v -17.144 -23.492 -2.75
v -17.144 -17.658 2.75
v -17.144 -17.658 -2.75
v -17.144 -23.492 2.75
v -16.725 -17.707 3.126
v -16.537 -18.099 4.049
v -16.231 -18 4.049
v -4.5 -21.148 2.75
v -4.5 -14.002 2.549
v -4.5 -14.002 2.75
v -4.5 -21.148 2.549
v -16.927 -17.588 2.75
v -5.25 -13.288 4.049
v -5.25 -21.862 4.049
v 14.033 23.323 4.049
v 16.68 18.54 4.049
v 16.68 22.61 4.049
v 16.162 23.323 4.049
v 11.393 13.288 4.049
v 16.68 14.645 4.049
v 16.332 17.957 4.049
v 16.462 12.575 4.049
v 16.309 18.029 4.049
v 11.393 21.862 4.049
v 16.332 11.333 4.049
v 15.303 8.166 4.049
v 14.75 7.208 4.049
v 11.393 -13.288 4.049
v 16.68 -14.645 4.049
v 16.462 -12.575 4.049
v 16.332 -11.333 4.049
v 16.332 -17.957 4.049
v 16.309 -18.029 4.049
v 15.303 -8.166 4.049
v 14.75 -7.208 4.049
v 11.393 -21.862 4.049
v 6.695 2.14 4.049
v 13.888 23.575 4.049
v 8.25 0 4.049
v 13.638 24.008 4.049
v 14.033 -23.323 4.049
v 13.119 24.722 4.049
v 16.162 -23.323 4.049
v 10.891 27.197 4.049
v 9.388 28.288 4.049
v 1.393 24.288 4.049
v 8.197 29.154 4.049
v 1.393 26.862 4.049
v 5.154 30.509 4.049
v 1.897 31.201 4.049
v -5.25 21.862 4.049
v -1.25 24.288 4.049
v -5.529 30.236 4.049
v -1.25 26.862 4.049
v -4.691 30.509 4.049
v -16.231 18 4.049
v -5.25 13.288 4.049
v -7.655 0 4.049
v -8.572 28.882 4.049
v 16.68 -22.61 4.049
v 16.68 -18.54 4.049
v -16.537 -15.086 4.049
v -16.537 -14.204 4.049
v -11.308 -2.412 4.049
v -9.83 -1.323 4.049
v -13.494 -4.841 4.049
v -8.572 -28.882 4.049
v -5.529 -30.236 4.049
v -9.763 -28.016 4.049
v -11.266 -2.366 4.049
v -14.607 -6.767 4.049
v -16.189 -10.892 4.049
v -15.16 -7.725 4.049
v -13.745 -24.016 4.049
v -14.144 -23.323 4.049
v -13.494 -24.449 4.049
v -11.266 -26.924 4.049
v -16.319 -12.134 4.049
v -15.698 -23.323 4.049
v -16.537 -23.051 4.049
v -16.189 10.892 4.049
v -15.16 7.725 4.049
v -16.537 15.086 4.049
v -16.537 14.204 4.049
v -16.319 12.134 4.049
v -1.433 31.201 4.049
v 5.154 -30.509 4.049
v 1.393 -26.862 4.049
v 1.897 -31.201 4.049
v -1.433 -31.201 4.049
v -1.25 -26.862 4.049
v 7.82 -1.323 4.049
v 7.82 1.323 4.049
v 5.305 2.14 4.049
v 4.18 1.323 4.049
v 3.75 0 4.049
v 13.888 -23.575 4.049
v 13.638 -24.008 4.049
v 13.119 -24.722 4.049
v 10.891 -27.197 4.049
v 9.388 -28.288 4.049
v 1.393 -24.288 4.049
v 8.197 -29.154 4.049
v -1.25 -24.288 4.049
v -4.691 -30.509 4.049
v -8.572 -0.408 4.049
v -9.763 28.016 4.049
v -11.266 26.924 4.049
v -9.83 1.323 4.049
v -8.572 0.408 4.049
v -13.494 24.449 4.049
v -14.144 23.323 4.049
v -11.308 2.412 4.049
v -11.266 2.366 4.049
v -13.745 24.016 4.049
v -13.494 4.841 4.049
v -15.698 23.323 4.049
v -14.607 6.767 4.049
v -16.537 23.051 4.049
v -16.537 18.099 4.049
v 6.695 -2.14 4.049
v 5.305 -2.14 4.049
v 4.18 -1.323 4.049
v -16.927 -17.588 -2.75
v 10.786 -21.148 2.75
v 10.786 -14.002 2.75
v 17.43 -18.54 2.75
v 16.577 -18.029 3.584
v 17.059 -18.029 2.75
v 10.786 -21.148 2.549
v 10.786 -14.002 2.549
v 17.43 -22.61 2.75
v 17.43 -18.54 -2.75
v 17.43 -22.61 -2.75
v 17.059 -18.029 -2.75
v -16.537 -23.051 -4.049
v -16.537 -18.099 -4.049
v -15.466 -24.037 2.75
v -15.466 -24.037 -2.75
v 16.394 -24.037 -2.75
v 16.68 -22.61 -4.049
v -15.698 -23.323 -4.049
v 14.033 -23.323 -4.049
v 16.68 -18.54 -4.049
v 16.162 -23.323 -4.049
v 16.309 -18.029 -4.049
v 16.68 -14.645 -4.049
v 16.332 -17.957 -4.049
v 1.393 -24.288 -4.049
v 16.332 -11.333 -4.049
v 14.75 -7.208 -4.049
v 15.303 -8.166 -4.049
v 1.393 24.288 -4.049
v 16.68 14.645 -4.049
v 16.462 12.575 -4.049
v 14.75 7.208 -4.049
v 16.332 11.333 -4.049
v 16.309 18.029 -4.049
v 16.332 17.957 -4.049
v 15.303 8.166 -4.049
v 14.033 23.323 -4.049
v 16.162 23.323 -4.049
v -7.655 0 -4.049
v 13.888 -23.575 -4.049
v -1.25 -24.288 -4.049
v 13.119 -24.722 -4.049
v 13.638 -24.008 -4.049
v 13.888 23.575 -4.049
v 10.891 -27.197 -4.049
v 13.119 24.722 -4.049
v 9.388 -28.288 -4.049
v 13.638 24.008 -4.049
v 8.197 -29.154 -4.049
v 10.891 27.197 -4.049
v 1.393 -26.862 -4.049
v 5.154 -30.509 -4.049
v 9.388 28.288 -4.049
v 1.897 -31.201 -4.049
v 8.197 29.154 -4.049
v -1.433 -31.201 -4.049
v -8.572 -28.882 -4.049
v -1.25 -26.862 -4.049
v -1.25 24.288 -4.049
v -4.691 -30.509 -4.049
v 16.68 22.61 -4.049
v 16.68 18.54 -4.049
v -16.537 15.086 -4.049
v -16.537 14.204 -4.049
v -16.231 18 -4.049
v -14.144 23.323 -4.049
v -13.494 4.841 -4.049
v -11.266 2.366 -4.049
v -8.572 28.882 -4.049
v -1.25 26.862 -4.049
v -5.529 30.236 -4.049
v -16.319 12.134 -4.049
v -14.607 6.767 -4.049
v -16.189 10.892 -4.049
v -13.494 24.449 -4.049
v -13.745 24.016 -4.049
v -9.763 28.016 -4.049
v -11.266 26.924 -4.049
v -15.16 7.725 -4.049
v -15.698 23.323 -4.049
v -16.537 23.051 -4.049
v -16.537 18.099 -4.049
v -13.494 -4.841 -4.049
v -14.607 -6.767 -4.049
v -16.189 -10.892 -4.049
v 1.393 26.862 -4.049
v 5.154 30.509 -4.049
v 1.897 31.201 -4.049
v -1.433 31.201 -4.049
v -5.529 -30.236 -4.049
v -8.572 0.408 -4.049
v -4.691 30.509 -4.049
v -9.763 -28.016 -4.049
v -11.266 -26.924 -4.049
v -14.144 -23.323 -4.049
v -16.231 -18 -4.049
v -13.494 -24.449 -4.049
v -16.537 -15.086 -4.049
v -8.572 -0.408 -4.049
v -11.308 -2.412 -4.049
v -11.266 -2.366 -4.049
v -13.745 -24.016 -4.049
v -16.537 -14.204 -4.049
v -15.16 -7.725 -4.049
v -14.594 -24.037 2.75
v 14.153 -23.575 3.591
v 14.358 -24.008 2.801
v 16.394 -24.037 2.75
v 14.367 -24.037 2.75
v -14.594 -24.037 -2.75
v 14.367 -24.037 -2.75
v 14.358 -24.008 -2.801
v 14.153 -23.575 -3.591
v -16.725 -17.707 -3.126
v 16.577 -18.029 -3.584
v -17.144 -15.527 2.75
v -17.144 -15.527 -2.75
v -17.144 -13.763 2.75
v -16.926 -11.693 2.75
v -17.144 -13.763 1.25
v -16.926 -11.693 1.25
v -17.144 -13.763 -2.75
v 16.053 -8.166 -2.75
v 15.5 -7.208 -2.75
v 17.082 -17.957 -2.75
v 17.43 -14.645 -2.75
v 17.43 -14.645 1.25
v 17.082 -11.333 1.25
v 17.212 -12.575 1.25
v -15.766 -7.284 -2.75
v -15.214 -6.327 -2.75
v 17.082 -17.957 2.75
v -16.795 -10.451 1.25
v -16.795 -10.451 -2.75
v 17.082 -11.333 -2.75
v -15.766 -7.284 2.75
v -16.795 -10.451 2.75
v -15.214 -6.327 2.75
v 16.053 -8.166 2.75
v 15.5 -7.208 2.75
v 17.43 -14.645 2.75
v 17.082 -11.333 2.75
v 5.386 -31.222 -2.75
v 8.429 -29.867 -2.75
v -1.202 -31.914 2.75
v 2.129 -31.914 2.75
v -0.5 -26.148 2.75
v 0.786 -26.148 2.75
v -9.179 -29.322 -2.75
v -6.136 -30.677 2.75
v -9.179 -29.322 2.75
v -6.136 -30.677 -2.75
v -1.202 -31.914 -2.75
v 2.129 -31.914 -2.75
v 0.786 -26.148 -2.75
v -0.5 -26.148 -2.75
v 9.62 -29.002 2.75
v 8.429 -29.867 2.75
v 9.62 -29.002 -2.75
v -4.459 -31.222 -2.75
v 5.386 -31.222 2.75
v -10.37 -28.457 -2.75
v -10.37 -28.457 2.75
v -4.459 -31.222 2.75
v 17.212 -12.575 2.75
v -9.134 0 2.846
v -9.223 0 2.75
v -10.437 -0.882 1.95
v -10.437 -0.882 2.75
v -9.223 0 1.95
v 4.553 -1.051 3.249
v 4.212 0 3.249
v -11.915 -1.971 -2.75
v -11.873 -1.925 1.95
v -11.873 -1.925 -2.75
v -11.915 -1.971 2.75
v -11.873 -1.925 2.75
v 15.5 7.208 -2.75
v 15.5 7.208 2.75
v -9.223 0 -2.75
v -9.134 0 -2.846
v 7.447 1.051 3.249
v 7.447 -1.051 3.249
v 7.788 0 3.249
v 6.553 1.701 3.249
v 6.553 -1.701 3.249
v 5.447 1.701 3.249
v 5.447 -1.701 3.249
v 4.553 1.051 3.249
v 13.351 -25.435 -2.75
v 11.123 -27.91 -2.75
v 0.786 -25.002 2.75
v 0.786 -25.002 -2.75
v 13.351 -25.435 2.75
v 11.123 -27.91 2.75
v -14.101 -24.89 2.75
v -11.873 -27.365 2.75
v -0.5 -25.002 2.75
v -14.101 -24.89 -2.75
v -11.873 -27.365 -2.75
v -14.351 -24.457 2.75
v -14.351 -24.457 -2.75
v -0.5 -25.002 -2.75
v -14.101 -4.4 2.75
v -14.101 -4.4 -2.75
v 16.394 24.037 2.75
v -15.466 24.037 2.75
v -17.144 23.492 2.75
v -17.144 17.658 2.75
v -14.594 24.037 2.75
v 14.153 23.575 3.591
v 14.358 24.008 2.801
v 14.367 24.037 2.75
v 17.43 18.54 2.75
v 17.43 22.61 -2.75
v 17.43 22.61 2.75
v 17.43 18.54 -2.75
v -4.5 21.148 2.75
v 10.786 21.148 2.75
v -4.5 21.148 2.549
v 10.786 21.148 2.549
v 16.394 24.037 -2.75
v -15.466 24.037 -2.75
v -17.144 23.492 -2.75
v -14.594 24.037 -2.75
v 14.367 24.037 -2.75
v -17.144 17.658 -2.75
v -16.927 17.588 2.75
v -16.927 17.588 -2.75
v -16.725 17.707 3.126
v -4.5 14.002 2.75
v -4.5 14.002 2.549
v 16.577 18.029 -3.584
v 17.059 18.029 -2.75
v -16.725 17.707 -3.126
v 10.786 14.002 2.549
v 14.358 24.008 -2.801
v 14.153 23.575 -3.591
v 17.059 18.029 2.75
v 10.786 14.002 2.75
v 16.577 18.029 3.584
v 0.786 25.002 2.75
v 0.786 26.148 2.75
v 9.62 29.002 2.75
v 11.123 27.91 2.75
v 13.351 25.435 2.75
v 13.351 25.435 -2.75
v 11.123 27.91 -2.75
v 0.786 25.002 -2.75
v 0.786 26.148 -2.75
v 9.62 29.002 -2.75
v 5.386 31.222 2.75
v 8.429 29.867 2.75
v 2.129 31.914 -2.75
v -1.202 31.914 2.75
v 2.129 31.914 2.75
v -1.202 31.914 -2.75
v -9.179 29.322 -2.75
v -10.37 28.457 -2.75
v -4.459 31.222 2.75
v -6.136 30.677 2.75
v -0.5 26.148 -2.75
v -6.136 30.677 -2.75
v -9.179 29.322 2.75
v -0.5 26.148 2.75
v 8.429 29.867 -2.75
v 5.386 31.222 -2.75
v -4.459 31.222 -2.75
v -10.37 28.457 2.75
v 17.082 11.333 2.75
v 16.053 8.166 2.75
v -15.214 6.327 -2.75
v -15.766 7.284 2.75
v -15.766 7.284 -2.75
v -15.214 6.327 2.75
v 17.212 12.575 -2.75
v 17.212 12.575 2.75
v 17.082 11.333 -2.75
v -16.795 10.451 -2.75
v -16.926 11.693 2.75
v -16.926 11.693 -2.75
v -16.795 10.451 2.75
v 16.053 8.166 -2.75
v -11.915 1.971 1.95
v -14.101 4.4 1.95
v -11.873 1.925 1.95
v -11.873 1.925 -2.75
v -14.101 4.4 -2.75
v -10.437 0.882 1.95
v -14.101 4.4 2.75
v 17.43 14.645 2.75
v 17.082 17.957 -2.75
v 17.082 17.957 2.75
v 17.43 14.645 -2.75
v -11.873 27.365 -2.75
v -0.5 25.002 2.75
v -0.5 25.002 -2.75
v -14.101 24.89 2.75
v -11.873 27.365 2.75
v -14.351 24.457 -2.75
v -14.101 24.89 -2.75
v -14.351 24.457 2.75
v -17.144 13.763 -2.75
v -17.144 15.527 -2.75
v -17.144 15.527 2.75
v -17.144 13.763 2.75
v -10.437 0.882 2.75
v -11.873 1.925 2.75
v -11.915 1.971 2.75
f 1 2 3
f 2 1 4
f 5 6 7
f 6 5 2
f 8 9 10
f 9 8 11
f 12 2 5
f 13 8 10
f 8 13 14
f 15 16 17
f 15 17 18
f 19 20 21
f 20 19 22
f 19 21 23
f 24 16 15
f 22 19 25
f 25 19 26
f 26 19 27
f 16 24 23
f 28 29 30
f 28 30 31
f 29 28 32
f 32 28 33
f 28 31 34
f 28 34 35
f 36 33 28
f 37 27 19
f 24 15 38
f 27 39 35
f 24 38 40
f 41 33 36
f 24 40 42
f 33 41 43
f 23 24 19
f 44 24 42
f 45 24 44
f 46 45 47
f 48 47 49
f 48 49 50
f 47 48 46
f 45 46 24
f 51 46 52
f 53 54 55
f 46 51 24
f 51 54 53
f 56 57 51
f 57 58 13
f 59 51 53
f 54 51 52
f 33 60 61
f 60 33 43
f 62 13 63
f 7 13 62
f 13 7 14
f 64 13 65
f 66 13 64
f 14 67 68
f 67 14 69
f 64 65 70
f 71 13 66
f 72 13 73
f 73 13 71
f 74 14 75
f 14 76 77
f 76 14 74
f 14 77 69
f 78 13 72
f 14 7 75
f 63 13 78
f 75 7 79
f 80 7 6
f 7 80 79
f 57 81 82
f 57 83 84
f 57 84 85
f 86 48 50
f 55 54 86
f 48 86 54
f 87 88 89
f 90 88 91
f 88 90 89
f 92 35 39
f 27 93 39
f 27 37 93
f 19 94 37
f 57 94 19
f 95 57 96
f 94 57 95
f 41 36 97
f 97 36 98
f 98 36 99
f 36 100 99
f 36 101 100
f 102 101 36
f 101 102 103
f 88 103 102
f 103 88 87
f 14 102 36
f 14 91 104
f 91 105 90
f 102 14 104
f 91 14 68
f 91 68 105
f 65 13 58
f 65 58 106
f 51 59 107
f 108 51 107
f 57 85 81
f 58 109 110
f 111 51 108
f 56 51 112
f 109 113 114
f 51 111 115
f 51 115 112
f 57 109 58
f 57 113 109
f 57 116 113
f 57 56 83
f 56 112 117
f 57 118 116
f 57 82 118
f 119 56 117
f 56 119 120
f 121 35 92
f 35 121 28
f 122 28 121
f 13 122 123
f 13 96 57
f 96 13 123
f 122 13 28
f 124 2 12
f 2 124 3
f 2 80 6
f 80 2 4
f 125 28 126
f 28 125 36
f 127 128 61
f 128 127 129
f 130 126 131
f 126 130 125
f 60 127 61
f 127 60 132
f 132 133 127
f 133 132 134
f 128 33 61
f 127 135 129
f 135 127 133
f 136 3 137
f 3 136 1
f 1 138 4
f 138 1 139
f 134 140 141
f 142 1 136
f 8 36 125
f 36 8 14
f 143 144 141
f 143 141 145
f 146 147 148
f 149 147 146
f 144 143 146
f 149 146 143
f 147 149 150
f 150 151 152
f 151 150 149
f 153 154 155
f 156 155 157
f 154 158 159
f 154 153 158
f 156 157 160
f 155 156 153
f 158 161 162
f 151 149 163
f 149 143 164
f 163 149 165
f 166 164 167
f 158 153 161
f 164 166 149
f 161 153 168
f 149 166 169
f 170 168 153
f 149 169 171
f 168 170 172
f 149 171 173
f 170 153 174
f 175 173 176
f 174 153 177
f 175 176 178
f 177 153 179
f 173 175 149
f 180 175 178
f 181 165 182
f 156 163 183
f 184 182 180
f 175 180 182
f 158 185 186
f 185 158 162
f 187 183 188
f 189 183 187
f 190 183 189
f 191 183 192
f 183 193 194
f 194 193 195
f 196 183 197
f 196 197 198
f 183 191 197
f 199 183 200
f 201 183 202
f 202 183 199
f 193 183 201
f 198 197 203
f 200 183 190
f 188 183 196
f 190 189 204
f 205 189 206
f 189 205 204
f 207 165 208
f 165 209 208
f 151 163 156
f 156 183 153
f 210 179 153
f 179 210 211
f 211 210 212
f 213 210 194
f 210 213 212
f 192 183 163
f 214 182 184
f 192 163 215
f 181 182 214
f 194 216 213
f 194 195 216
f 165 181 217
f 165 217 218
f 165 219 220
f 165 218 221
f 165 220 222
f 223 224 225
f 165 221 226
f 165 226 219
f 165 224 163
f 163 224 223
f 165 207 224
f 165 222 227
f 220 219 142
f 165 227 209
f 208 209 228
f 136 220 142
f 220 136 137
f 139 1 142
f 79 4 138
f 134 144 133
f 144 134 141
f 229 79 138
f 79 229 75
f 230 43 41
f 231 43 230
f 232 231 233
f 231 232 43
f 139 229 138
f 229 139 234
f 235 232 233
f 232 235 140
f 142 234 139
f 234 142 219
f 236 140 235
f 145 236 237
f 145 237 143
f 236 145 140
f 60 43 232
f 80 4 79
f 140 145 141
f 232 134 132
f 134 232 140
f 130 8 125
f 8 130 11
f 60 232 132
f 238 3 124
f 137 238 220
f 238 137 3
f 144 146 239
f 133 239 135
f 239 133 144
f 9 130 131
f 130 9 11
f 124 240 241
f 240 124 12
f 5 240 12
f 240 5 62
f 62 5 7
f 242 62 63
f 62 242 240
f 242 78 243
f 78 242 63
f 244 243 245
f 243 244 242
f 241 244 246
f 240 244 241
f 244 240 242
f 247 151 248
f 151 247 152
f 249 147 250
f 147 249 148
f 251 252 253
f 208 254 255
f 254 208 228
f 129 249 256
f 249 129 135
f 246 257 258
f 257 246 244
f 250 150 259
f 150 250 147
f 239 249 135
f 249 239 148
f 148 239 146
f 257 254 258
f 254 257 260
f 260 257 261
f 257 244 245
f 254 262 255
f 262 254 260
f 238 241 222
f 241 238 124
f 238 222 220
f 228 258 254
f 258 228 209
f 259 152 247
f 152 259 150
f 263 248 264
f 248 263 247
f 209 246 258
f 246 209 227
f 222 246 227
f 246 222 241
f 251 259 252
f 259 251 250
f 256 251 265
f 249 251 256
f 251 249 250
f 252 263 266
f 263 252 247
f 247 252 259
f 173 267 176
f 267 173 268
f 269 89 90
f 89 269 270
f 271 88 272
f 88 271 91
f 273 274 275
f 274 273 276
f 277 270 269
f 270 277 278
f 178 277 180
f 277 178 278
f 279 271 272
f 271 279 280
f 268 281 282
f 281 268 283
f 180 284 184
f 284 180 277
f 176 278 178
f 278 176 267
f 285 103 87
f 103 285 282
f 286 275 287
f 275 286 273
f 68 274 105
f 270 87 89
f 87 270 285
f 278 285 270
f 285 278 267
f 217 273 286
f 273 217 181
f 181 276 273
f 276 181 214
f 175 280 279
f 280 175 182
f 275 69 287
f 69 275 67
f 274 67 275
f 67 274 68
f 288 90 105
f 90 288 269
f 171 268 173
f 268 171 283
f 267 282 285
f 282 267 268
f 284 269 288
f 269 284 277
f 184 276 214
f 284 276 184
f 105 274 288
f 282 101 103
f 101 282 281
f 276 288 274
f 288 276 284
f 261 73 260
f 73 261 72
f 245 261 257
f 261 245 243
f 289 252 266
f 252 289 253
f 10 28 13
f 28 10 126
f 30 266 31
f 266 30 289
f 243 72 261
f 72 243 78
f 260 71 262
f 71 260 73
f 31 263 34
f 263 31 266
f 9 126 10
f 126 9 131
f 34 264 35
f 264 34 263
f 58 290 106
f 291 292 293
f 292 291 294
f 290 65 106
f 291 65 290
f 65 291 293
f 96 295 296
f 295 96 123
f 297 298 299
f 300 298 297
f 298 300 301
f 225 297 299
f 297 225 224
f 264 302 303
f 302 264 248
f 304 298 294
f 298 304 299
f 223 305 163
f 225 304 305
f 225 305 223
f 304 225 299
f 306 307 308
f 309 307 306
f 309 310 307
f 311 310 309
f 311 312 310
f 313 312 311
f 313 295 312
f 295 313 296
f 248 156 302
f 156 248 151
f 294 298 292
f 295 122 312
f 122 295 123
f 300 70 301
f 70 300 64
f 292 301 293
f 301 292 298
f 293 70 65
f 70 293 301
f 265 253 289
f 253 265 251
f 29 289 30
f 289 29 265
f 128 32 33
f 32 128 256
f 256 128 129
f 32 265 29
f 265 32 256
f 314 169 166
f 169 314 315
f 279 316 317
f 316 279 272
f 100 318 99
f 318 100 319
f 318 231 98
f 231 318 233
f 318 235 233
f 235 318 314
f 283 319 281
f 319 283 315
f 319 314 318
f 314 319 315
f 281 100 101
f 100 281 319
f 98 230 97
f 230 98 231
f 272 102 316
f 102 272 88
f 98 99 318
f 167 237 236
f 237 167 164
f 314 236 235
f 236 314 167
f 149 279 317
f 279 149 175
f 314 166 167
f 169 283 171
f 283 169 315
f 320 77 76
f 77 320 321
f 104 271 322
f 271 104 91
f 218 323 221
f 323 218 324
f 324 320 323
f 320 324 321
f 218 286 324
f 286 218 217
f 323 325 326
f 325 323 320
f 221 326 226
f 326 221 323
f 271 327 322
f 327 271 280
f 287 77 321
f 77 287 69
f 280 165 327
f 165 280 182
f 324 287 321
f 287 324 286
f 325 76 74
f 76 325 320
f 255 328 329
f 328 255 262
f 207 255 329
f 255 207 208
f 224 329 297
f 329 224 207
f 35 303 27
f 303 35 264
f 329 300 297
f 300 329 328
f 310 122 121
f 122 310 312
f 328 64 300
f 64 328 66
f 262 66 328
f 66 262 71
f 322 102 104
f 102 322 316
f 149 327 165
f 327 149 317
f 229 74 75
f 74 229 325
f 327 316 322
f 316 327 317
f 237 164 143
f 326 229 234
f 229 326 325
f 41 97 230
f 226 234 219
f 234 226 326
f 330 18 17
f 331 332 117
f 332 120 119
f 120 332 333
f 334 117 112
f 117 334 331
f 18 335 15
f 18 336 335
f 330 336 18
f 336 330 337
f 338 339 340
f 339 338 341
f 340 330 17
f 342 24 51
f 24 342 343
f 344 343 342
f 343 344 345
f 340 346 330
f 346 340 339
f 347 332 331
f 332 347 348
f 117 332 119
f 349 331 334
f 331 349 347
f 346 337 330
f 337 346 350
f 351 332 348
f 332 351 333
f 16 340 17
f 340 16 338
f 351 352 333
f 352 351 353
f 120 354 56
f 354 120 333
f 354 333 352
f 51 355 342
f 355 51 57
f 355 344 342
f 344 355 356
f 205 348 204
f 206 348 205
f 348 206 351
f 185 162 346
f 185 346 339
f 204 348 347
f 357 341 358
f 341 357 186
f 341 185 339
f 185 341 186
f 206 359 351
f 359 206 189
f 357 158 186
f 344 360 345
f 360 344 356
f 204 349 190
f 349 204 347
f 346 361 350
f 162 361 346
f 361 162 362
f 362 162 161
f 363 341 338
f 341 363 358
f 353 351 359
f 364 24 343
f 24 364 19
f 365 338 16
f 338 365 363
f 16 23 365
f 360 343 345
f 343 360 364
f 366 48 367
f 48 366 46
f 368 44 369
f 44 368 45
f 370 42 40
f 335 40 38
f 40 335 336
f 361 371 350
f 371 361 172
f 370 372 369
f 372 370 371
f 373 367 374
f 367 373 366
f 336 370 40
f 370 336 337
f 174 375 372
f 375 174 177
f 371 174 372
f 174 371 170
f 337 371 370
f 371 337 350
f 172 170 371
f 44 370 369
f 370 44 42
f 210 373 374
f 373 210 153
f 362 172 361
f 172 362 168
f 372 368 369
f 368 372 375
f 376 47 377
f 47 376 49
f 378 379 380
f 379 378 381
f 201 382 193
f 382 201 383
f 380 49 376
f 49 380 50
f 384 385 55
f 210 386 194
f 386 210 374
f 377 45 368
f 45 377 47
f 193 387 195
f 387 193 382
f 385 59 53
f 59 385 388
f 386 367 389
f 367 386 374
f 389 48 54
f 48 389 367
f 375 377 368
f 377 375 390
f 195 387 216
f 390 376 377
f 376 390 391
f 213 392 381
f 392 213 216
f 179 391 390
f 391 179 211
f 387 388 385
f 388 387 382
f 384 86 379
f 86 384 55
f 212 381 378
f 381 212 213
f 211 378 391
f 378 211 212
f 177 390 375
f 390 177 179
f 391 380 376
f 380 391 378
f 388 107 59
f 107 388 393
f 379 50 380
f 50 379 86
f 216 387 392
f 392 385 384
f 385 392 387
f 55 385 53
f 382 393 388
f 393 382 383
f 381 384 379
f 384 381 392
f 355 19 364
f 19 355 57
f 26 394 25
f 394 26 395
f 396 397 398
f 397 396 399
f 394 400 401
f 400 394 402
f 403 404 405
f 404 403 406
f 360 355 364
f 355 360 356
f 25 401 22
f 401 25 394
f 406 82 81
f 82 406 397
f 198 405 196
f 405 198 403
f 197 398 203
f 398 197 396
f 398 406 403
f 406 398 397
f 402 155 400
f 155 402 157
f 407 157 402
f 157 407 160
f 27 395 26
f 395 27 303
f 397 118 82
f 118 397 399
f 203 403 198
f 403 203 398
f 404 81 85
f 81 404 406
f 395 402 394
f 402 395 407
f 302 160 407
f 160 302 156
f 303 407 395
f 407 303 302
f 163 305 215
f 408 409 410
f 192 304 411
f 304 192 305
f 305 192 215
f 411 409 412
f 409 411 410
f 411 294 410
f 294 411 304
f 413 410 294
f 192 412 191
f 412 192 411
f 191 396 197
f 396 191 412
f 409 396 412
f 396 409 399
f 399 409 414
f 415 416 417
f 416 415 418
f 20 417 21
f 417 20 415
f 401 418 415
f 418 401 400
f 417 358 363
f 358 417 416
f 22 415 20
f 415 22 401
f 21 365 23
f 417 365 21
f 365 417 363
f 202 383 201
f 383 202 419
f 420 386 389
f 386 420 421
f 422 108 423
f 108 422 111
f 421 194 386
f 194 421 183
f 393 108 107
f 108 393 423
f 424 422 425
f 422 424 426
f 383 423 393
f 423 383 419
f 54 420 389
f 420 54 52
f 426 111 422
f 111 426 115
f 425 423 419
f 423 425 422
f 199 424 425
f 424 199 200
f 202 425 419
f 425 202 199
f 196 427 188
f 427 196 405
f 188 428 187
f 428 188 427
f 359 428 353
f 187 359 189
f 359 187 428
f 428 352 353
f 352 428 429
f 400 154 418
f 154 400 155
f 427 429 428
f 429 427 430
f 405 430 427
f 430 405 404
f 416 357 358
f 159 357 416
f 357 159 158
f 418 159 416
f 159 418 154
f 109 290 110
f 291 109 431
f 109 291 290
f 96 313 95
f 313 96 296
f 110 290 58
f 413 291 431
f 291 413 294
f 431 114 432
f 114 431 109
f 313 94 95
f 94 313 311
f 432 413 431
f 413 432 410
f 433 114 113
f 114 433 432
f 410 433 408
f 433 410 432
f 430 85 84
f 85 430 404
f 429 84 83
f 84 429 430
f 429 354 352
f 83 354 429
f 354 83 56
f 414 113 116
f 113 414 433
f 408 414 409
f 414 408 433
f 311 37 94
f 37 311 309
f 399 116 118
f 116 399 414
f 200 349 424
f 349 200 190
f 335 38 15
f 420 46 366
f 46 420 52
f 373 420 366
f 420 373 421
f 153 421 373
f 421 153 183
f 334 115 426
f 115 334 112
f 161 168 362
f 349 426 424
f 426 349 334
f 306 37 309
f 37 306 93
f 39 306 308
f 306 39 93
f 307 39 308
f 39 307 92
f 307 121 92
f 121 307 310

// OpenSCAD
// Parameters
bbox_X = 31.86; //[15.93:63.72:0.01]
bbox_Y = 61.15; //[30.58:122.3:0.01]
bbox_Z = 5.5; //[2.75:11:0.01]
plate_thk = 5.5; //[2.75:11:0.01]
tab_W = 31.86; //[15.93:63.72:0.01]
tab_L = 20; //[10:40:0.01]
tab_end_R = 15.93; //[7.965:31.86:0.01]
web_W = 16; //[8:32:0.01]
web_L = 21.15; //[10.58:42.3:0.01]
web_offset_X = 6; //[0:12:0.01]
hole_sq = 4; //[2:8:0.01]
hole_tip_margin = 5; //[2.5:10:0.01]
recess_L = 10; //[5:20:0.01]
recess_W = 18; //[9:36:0.01]
recess_depth = 1; //[0.5:2:0.01]
recess_from_transition = 2; //[1:4:0.01]
overlap = 1; //[0.5:2:0.01]
fillet_r = 1.5; //[0.5:3:0.01]
marking_depth = 0.3; //[0.1:0.8:0.01]
marking_r = 3; //[1.5:6:0.01]

// Base Shapes
module end_tab_left_rect() {
  translate([0, -(bbox_Y/2 - tab_L/2), 0])
    cube([tab_W, tab_L - tab_end_R, plate_thk], center=true);
}

module end_tab_left_round() {
  translate([0, -(bbox_Y/2 - tab_end_R), 0])
    cylinder(r=tab_end_R, h=plate_thk, center=true);
}

module end_tab_right_rect() {
  translate([0, (bbox_Y/2 - tab_L/2), 0])
    cube([tab_W, tab_L - tab_end_R, plate_thk], center=true);
}

module end_tab_right_round() {
  translate([0, (bbox_Y/2 - tab_end_R), 0])
    cylinder(r=tab_end_R, h=plate_thk, center=true);
}

module central_web_offset() {
  translate([web_offset_X, 0, 0])
    cube([web_W, web_L + 2*overlap, plate_thk], center=true);
}

module additional_rounding_at_web_transitions() {
  translate([web_offset_X, 0, 0])
    cylinder(r=web_W/2, h=plate_thk, center=true);
}

module square_hole_left() {
  translate([0, -(bbox_Y/2 - hole_tip_margin), 0])
    cube([hole_sq, hole_sq, plate_thk + 2*overlap], center=true);
}

module square_hole_right() {
  translate([0, (bbox_Y/2 - hole_tip_margin), 0])
    cube([hole_sq, hole_sq, plate_thk + 2*overlap], center=true);
}

module recess_step_left() {
  translate([web_offset_X/2, -(web_L/2 + recess_from_transition + recess_L/2), plate_thk/2 - recess_depth/2])
    cube([recess_W, recess_L, recess_depth + overlap], center=true);
}

module recess_step_right() {
  translate([web_offset_X/2, (web_L/2 + recess_from_transition + recess_L/2), plate_thk/2 - recess_depth/2])
    cube([recess_W, recess_L, recess_depth + overlap], center=true);
}

module surface_markings() {
  translate([web_offset_X, 0, plate_thk/2 - marking_depth/2])
    cylinder(r=marking_r, h=marking_depth + overlap, center=true);
}

module edge_fillets_chamfers_sphere() {
  sphere(r=fillet_r, center=true);
}

// Operations
module end_tab_left() {
  union() {
    end_tab_left_rect();
    end_tab_left_round();
  }
}

module end_tab_right() {
  union() {
    end_tab_right_rect();
    end_tab_right_round();
  }
}

module link_plate_outline() {
  union() {
    end_tab_left();
    end_tab_right();
    central_web_offset();
    additional_rounding_at_web_transitions();
  }
}

module link_plate_with_holes() {
  difference() {
    link_plate_outline();
    square_hole_left();
    square_hole_right();
  }
}

module link_plate_with_recesses() {
  difference() {
    link_plate_with_holes();
    recess_step_left();
    recess_step_right();
    surface_markings();
  }
}

// Final Output
minkowski() {
  link_plate_with_recesses();
  edge_fillets_chamfers_sphere();
}
